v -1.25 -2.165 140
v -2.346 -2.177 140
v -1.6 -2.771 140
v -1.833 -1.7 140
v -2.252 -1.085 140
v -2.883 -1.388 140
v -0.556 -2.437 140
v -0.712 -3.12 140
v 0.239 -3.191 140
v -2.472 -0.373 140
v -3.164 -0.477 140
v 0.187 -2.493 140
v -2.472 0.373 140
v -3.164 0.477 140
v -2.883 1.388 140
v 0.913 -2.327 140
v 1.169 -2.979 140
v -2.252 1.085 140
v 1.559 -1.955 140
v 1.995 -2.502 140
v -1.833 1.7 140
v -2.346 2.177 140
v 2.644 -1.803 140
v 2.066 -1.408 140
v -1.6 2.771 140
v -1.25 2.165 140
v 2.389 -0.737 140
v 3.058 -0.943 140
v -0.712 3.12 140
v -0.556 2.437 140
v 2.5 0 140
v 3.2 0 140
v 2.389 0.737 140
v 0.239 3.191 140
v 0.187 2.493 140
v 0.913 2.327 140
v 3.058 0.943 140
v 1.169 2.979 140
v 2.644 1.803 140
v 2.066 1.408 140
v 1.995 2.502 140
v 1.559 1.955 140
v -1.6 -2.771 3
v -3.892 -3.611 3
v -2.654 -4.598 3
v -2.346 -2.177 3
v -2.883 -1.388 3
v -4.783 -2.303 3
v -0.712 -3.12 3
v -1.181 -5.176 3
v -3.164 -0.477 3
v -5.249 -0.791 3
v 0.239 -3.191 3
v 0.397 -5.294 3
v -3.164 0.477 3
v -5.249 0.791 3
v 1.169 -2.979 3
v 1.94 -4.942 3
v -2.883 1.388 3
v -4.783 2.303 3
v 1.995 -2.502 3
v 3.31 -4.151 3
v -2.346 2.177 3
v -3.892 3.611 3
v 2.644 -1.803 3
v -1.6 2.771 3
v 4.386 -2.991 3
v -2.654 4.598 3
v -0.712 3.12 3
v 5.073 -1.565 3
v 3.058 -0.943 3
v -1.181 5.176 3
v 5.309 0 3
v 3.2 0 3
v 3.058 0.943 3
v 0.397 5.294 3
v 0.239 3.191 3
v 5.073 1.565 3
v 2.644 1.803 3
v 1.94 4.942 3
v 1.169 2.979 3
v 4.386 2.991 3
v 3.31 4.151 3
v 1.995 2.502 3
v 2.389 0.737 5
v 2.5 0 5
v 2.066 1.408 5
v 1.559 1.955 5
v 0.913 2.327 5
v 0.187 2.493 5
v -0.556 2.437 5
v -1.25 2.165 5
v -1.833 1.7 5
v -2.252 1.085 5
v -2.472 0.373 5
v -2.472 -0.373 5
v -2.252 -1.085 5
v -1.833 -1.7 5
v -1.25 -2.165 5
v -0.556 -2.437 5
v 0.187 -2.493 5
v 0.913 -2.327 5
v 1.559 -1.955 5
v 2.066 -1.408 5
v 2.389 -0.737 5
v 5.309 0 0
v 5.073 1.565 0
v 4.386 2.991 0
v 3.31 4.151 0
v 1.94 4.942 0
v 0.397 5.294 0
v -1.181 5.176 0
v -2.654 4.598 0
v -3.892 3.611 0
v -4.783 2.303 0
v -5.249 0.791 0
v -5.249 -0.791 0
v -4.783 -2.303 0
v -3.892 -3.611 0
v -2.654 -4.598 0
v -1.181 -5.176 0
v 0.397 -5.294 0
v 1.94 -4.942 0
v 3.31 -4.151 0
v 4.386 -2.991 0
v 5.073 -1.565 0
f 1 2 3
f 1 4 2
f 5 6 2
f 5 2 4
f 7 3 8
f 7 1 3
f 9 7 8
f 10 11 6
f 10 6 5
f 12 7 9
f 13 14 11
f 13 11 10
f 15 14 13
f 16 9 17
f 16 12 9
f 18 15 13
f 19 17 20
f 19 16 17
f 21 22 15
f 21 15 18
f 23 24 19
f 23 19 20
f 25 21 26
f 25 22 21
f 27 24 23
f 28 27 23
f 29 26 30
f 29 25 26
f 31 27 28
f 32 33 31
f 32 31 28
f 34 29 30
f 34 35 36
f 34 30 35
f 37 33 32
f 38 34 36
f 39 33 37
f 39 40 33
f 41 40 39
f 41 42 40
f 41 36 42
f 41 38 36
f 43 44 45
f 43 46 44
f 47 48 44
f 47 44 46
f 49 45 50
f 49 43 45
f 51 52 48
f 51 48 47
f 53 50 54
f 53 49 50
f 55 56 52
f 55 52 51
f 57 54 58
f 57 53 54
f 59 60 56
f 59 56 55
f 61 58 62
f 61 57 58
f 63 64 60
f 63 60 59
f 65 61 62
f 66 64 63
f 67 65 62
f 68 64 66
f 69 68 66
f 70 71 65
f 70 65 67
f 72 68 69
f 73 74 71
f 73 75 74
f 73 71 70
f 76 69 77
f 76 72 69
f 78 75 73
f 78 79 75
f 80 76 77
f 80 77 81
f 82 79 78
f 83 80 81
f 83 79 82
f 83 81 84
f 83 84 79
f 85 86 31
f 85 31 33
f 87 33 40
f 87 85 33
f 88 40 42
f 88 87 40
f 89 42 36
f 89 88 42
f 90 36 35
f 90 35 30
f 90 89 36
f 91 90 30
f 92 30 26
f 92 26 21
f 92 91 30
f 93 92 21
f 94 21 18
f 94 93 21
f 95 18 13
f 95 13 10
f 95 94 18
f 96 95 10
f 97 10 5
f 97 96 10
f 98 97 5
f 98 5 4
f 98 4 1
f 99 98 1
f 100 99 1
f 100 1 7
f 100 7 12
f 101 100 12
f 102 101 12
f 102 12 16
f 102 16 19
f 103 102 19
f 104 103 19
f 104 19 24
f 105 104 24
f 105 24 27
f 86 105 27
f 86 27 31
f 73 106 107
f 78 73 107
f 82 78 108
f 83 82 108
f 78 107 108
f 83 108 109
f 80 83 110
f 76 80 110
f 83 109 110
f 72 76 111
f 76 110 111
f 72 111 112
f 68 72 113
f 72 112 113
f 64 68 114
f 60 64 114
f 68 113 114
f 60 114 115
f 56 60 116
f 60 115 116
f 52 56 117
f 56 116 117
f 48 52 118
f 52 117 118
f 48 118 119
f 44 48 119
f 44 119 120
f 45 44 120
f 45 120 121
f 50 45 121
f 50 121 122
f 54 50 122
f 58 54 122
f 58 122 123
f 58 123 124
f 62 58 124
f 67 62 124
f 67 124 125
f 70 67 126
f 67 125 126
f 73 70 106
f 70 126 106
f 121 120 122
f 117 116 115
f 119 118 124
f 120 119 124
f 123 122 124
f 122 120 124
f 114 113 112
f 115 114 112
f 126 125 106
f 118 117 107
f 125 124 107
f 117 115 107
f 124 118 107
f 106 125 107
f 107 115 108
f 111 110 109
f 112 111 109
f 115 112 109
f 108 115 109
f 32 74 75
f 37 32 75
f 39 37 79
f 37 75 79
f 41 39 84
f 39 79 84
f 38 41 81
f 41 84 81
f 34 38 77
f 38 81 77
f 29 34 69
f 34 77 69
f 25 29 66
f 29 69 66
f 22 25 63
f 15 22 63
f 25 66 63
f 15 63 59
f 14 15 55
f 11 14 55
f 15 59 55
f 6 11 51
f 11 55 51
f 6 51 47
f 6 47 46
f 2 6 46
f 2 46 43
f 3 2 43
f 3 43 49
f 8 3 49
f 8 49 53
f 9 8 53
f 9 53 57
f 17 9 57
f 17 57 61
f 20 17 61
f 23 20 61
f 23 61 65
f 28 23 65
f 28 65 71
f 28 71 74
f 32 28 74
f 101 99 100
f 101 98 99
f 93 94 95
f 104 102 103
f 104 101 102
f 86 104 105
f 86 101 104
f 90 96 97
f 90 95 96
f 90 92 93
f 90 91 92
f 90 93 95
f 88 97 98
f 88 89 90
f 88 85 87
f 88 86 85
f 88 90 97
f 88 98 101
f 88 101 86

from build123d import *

# Parameters (mm, degrees)
F0_R     = 5.308755
F0_R_2   = 3.2
F0_R_3   = 2.5
F1_DEPTH = 3
F2_DEPTH = 5
F3_DEPTH = 140


with BuildPart() as f1:
    # F0 (on Top) → F1 (new body)
    with BuildSketch(Plane.XY):
        Circle(F0_R)
        Circle(F0_R_2, mode=Mode.SUBTRACT)
        Circle(F0_R_2)
        Circle(F0_R_3, mode=Mode.SUBTRACT)
        Circle(F0_R_3)
    extrude(amount=F1_DEPTH)

    # F0 (on Top) → F2 (join)
    with BuildSketch(Plane.XY):
        Circle(F0_R_2)
        Circle(F0_R_3, mode=Mode.SUBTRACT)
        Circle(F0_R_3)
    extrude(amount=F2_DEPTH)

    # F0 (on Top) → F3 (join)
    with BuildSketch(Plane.XY):
        Circle(F0_R_2)
        Circle(F0_R_3, mode=Mode.SUBTRACT)
    extrude(amount=F3_DEPTH)


solid = f1.part
